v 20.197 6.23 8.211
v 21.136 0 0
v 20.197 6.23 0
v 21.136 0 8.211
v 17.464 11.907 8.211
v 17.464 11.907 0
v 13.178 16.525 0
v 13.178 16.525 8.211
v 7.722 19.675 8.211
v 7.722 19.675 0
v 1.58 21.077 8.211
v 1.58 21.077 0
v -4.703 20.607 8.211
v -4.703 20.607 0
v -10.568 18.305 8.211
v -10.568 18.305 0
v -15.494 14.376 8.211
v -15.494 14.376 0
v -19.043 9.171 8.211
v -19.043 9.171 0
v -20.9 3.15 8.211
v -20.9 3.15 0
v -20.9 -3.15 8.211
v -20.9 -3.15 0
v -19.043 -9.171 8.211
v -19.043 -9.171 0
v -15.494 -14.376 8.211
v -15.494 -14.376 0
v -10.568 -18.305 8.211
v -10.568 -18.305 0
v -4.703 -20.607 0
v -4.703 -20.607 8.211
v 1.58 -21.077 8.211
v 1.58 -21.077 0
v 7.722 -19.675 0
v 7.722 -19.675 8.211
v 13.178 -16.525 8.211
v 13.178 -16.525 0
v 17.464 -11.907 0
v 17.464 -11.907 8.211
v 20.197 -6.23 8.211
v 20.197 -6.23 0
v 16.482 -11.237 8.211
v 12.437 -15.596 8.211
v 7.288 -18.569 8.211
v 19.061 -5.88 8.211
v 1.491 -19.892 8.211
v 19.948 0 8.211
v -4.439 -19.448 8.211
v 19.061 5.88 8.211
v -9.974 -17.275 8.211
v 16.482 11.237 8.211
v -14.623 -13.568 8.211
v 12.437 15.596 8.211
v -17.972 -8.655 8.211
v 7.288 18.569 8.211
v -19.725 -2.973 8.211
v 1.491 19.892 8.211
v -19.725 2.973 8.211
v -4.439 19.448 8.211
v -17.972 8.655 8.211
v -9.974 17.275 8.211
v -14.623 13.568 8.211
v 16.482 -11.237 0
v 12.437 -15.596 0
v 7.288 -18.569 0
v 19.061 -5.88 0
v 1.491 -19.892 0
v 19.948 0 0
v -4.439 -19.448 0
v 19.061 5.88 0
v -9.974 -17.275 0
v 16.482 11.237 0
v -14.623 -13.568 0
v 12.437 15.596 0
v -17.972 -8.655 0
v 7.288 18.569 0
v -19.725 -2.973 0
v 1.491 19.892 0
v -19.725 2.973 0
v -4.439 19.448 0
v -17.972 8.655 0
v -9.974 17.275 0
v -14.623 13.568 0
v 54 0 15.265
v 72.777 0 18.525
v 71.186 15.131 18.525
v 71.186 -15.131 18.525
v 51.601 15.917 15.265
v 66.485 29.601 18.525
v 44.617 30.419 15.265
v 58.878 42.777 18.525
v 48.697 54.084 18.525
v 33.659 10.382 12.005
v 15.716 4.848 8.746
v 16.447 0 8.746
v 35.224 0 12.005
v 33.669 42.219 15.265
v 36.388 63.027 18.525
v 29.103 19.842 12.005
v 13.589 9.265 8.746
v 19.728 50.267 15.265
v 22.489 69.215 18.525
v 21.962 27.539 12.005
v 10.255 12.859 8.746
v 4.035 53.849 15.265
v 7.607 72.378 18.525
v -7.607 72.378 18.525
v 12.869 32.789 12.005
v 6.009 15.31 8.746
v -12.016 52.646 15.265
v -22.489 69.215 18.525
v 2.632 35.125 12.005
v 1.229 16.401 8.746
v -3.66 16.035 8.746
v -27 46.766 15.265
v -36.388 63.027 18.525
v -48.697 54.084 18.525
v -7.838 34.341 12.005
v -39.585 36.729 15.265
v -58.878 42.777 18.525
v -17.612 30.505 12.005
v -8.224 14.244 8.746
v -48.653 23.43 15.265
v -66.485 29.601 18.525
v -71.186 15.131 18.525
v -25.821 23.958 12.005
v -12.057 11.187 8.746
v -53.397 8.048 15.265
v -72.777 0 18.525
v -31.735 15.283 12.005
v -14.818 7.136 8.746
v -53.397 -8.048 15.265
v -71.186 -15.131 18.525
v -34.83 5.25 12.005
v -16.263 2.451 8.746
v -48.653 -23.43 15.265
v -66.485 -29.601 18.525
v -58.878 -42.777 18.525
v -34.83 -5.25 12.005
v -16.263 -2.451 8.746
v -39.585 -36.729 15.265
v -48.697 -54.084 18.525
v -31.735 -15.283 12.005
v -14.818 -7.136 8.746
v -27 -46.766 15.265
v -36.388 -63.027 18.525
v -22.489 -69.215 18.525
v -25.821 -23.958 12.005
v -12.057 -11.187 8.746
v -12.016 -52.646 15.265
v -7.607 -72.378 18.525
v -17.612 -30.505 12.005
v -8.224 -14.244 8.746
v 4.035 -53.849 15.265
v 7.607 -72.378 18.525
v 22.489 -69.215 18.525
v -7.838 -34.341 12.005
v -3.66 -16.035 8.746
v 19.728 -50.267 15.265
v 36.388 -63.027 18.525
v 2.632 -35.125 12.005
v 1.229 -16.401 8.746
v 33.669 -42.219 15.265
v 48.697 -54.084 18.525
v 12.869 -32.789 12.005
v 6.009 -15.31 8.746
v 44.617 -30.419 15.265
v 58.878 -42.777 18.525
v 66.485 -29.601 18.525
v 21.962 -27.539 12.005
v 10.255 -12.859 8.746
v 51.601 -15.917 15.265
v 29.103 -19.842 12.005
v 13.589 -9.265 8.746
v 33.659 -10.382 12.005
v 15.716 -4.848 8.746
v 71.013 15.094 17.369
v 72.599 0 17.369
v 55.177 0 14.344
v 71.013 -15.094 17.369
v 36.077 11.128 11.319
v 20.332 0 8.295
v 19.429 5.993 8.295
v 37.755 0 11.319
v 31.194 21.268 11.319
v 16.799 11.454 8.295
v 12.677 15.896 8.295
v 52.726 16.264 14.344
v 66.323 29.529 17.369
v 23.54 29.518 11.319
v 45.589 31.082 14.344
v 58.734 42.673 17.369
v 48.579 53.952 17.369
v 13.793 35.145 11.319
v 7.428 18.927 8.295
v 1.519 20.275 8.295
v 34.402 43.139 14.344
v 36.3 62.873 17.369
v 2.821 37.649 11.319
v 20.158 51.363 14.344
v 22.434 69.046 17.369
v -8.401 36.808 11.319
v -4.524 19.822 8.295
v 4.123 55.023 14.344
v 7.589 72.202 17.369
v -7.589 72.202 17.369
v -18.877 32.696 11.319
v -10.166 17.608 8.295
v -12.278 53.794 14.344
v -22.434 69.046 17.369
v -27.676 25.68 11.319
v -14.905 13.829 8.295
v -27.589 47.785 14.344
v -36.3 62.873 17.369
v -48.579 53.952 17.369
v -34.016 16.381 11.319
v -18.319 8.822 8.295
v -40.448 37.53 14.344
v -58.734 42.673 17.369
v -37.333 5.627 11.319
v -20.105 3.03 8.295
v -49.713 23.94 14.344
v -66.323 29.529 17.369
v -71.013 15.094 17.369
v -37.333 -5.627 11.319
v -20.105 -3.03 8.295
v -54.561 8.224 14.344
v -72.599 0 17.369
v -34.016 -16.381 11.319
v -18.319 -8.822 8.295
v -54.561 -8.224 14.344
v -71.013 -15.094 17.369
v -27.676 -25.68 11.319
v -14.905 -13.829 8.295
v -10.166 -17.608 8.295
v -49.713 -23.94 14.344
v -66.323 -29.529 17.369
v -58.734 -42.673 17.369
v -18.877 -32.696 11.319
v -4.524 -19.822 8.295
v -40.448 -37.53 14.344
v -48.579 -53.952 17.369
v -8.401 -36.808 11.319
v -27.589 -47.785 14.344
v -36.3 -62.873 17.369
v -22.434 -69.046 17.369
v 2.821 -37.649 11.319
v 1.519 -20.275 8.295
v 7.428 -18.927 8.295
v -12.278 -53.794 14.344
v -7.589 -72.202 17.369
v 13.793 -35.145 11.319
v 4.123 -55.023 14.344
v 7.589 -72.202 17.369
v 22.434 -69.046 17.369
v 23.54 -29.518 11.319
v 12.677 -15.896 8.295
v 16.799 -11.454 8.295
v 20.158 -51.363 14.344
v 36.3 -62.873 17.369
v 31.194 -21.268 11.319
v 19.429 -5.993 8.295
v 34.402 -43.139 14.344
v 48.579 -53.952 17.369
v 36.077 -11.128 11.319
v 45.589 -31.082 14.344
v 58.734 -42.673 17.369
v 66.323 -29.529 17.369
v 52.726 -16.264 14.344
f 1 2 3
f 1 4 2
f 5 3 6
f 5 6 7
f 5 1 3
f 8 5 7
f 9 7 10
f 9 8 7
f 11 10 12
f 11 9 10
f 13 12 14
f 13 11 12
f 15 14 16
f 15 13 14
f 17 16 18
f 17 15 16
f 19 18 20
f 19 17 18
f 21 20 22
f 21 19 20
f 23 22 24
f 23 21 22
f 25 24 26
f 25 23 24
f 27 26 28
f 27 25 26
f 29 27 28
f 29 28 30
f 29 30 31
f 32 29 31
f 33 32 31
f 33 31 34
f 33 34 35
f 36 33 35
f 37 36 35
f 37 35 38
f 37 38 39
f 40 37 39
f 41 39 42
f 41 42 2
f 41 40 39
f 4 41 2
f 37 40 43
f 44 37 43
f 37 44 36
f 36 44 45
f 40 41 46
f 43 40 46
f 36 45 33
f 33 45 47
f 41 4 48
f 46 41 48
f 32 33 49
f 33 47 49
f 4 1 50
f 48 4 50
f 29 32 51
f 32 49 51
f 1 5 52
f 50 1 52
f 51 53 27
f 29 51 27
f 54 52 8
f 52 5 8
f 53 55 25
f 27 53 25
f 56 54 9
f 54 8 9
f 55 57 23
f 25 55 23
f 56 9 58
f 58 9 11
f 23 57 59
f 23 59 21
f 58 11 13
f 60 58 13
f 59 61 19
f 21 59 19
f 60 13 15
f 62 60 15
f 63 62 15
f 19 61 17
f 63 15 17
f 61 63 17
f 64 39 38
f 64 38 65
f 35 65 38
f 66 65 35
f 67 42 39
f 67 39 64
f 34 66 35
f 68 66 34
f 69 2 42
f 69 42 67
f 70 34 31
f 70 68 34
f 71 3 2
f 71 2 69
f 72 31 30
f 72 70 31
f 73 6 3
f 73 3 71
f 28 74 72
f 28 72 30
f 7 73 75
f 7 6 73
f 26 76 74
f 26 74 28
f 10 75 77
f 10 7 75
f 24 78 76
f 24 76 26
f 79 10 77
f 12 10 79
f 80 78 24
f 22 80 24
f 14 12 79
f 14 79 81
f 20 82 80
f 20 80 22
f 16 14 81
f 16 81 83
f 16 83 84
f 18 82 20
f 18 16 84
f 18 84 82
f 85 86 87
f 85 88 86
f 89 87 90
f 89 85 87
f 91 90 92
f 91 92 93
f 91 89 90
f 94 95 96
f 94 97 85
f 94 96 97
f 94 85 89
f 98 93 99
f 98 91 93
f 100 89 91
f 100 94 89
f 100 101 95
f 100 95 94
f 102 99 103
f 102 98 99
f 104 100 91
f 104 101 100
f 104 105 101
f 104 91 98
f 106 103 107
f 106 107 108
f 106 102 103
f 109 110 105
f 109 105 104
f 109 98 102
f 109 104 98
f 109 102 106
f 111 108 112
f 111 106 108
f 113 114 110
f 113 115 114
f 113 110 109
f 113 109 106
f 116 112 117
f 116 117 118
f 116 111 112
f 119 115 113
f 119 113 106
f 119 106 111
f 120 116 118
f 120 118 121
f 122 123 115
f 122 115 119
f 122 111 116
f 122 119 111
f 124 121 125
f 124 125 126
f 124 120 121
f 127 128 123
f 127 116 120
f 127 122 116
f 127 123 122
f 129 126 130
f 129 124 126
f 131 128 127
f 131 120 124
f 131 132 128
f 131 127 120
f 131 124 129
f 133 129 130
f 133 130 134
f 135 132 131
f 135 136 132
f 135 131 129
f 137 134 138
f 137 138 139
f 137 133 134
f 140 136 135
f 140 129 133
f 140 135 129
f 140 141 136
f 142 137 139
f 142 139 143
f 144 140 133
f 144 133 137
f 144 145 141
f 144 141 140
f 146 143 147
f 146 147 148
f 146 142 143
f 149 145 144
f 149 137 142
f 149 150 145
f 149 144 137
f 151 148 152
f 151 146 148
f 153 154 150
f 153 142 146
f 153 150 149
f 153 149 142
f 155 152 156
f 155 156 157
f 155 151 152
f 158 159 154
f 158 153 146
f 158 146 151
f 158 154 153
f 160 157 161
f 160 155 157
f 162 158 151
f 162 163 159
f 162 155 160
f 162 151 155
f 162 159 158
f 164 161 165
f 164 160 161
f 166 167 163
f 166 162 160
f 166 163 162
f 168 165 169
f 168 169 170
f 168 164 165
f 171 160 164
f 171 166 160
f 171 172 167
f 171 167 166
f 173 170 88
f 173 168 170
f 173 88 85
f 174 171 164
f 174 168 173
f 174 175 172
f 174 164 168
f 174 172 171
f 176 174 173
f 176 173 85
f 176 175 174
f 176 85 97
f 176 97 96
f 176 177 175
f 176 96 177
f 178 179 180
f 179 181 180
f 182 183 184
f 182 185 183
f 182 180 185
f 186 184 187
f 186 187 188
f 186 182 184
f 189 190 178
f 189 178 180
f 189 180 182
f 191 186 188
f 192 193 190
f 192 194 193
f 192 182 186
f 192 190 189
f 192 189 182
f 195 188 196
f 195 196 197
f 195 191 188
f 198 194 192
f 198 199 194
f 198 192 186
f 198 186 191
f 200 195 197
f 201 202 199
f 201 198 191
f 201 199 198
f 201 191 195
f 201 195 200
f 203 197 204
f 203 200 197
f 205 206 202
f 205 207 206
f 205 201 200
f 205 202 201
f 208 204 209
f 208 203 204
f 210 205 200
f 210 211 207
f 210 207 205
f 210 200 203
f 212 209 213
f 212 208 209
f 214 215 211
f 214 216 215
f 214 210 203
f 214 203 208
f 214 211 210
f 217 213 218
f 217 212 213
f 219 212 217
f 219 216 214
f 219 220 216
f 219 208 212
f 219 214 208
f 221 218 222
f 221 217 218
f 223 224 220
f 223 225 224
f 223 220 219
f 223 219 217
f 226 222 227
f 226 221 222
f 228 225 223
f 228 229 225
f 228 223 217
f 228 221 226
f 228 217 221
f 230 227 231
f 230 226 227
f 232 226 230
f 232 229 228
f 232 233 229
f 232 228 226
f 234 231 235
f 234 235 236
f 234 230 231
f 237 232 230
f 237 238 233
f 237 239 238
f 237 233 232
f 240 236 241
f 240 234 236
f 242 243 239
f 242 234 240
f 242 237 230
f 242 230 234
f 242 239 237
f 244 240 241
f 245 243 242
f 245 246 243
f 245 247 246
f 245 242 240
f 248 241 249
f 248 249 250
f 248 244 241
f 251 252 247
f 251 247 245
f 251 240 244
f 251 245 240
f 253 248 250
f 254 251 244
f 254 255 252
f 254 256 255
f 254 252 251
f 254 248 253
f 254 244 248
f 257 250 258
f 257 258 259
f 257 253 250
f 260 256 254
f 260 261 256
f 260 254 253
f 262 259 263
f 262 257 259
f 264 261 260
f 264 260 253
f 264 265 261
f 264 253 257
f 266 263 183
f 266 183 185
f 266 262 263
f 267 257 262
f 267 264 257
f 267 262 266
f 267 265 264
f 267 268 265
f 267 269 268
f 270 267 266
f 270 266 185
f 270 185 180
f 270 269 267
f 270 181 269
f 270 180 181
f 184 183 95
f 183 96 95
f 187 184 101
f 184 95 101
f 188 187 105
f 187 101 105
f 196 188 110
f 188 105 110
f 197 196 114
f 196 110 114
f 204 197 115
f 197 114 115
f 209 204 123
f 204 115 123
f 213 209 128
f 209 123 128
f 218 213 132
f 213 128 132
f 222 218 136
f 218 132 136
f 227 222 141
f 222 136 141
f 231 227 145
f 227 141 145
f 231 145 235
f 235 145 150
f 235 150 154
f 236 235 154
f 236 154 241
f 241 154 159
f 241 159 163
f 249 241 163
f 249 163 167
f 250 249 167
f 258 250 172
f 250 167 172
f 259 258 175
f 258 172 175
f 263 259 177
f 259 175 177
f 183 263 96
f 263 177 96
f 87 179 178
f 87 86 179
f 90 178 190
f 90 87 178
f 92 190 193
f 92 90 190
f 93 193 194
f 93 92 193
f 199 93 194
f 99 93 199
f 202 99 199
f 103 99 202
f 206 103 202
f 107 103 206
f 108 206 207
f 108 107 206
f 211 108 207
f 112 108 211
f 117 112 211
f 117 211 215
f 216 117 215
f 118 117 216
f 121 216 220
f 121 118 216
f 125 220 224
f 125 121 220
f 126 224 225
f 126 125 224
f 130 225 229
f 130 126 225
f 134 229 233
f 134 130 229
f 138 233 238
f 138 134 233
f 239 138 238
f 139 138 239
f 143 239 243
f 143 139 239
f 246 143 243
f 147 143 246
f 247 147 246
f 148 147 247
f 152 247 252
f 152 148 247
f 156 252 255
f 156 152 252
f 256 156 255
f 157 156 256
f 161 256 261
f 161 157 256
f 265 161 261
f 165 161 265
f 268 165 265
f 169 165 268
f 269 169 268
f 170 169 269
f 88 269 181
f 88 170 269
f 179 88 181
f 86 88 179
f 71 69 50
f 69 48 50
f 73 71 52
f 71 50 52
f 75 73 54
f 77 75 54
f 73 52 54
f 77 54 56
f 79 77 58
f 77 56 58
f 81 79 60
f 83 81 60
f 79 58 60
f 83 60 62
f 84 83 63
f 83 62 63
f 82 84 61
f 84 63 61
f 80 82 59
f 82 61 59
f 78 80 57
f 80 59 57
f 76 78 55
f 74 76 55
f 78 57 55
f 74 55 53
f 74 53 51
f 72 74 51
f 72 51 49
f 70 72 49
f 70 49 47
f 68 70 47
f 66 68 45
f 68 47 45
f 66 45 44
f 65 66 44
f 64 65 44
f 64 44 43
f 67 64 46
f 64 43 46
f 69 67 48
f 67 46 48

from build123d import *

# Parameters (mm, degrees)
F0_W = 1.1887382716
F0_H = 8.2106888294


# Not quite as in the source:
# - the program builds the solid bodies; features that only make, move or delete a surface that nothing else refers to are left out


with BuildPart() as f2:
    # F0 (on Front) → F2 (revolve)
    with BuildSketch(Plane.XZ):
        with Locations((20.5420861021, 4.1053444147)):
            Rectangle(F0_W, F0_H)
    revolve(axis=Axis((0, 0, 14.6341603249), (0, 0, 1)))


with BuildPart() as f4:
    # F3 (on Front) → F4 (revolve)
    with BuildSketch(Plane.XZ):
        with BuildLine():
            add(Edge.make_bspline(
                [(20.3322526067, 8.2946820185), (19.2627200389, 8.4468284836), (18.1931874711, 8.5989749487), (16.4470637122, 8.7455055095)],
                knots=[0, 0, 0, 0, 0.3276532475, 0.3276532475, 0.3276532475, 0.3276532475], degree=3))
            Line((20.3322526067, 8.2946820185), (72.5994333625, 17.368843779))
            Line((72.5994333625, 17.368843779), (72.7768065665, 18.5249730683))
            Line((72.7768065665, 18.5249730683), (16.4470637122, 8.7455055095))
        make_face()
    revolve(axis=Axis((0, 0, 14.6341603249), (0, 0, 1)))


solid = Compound([f2.part, f4.part])
